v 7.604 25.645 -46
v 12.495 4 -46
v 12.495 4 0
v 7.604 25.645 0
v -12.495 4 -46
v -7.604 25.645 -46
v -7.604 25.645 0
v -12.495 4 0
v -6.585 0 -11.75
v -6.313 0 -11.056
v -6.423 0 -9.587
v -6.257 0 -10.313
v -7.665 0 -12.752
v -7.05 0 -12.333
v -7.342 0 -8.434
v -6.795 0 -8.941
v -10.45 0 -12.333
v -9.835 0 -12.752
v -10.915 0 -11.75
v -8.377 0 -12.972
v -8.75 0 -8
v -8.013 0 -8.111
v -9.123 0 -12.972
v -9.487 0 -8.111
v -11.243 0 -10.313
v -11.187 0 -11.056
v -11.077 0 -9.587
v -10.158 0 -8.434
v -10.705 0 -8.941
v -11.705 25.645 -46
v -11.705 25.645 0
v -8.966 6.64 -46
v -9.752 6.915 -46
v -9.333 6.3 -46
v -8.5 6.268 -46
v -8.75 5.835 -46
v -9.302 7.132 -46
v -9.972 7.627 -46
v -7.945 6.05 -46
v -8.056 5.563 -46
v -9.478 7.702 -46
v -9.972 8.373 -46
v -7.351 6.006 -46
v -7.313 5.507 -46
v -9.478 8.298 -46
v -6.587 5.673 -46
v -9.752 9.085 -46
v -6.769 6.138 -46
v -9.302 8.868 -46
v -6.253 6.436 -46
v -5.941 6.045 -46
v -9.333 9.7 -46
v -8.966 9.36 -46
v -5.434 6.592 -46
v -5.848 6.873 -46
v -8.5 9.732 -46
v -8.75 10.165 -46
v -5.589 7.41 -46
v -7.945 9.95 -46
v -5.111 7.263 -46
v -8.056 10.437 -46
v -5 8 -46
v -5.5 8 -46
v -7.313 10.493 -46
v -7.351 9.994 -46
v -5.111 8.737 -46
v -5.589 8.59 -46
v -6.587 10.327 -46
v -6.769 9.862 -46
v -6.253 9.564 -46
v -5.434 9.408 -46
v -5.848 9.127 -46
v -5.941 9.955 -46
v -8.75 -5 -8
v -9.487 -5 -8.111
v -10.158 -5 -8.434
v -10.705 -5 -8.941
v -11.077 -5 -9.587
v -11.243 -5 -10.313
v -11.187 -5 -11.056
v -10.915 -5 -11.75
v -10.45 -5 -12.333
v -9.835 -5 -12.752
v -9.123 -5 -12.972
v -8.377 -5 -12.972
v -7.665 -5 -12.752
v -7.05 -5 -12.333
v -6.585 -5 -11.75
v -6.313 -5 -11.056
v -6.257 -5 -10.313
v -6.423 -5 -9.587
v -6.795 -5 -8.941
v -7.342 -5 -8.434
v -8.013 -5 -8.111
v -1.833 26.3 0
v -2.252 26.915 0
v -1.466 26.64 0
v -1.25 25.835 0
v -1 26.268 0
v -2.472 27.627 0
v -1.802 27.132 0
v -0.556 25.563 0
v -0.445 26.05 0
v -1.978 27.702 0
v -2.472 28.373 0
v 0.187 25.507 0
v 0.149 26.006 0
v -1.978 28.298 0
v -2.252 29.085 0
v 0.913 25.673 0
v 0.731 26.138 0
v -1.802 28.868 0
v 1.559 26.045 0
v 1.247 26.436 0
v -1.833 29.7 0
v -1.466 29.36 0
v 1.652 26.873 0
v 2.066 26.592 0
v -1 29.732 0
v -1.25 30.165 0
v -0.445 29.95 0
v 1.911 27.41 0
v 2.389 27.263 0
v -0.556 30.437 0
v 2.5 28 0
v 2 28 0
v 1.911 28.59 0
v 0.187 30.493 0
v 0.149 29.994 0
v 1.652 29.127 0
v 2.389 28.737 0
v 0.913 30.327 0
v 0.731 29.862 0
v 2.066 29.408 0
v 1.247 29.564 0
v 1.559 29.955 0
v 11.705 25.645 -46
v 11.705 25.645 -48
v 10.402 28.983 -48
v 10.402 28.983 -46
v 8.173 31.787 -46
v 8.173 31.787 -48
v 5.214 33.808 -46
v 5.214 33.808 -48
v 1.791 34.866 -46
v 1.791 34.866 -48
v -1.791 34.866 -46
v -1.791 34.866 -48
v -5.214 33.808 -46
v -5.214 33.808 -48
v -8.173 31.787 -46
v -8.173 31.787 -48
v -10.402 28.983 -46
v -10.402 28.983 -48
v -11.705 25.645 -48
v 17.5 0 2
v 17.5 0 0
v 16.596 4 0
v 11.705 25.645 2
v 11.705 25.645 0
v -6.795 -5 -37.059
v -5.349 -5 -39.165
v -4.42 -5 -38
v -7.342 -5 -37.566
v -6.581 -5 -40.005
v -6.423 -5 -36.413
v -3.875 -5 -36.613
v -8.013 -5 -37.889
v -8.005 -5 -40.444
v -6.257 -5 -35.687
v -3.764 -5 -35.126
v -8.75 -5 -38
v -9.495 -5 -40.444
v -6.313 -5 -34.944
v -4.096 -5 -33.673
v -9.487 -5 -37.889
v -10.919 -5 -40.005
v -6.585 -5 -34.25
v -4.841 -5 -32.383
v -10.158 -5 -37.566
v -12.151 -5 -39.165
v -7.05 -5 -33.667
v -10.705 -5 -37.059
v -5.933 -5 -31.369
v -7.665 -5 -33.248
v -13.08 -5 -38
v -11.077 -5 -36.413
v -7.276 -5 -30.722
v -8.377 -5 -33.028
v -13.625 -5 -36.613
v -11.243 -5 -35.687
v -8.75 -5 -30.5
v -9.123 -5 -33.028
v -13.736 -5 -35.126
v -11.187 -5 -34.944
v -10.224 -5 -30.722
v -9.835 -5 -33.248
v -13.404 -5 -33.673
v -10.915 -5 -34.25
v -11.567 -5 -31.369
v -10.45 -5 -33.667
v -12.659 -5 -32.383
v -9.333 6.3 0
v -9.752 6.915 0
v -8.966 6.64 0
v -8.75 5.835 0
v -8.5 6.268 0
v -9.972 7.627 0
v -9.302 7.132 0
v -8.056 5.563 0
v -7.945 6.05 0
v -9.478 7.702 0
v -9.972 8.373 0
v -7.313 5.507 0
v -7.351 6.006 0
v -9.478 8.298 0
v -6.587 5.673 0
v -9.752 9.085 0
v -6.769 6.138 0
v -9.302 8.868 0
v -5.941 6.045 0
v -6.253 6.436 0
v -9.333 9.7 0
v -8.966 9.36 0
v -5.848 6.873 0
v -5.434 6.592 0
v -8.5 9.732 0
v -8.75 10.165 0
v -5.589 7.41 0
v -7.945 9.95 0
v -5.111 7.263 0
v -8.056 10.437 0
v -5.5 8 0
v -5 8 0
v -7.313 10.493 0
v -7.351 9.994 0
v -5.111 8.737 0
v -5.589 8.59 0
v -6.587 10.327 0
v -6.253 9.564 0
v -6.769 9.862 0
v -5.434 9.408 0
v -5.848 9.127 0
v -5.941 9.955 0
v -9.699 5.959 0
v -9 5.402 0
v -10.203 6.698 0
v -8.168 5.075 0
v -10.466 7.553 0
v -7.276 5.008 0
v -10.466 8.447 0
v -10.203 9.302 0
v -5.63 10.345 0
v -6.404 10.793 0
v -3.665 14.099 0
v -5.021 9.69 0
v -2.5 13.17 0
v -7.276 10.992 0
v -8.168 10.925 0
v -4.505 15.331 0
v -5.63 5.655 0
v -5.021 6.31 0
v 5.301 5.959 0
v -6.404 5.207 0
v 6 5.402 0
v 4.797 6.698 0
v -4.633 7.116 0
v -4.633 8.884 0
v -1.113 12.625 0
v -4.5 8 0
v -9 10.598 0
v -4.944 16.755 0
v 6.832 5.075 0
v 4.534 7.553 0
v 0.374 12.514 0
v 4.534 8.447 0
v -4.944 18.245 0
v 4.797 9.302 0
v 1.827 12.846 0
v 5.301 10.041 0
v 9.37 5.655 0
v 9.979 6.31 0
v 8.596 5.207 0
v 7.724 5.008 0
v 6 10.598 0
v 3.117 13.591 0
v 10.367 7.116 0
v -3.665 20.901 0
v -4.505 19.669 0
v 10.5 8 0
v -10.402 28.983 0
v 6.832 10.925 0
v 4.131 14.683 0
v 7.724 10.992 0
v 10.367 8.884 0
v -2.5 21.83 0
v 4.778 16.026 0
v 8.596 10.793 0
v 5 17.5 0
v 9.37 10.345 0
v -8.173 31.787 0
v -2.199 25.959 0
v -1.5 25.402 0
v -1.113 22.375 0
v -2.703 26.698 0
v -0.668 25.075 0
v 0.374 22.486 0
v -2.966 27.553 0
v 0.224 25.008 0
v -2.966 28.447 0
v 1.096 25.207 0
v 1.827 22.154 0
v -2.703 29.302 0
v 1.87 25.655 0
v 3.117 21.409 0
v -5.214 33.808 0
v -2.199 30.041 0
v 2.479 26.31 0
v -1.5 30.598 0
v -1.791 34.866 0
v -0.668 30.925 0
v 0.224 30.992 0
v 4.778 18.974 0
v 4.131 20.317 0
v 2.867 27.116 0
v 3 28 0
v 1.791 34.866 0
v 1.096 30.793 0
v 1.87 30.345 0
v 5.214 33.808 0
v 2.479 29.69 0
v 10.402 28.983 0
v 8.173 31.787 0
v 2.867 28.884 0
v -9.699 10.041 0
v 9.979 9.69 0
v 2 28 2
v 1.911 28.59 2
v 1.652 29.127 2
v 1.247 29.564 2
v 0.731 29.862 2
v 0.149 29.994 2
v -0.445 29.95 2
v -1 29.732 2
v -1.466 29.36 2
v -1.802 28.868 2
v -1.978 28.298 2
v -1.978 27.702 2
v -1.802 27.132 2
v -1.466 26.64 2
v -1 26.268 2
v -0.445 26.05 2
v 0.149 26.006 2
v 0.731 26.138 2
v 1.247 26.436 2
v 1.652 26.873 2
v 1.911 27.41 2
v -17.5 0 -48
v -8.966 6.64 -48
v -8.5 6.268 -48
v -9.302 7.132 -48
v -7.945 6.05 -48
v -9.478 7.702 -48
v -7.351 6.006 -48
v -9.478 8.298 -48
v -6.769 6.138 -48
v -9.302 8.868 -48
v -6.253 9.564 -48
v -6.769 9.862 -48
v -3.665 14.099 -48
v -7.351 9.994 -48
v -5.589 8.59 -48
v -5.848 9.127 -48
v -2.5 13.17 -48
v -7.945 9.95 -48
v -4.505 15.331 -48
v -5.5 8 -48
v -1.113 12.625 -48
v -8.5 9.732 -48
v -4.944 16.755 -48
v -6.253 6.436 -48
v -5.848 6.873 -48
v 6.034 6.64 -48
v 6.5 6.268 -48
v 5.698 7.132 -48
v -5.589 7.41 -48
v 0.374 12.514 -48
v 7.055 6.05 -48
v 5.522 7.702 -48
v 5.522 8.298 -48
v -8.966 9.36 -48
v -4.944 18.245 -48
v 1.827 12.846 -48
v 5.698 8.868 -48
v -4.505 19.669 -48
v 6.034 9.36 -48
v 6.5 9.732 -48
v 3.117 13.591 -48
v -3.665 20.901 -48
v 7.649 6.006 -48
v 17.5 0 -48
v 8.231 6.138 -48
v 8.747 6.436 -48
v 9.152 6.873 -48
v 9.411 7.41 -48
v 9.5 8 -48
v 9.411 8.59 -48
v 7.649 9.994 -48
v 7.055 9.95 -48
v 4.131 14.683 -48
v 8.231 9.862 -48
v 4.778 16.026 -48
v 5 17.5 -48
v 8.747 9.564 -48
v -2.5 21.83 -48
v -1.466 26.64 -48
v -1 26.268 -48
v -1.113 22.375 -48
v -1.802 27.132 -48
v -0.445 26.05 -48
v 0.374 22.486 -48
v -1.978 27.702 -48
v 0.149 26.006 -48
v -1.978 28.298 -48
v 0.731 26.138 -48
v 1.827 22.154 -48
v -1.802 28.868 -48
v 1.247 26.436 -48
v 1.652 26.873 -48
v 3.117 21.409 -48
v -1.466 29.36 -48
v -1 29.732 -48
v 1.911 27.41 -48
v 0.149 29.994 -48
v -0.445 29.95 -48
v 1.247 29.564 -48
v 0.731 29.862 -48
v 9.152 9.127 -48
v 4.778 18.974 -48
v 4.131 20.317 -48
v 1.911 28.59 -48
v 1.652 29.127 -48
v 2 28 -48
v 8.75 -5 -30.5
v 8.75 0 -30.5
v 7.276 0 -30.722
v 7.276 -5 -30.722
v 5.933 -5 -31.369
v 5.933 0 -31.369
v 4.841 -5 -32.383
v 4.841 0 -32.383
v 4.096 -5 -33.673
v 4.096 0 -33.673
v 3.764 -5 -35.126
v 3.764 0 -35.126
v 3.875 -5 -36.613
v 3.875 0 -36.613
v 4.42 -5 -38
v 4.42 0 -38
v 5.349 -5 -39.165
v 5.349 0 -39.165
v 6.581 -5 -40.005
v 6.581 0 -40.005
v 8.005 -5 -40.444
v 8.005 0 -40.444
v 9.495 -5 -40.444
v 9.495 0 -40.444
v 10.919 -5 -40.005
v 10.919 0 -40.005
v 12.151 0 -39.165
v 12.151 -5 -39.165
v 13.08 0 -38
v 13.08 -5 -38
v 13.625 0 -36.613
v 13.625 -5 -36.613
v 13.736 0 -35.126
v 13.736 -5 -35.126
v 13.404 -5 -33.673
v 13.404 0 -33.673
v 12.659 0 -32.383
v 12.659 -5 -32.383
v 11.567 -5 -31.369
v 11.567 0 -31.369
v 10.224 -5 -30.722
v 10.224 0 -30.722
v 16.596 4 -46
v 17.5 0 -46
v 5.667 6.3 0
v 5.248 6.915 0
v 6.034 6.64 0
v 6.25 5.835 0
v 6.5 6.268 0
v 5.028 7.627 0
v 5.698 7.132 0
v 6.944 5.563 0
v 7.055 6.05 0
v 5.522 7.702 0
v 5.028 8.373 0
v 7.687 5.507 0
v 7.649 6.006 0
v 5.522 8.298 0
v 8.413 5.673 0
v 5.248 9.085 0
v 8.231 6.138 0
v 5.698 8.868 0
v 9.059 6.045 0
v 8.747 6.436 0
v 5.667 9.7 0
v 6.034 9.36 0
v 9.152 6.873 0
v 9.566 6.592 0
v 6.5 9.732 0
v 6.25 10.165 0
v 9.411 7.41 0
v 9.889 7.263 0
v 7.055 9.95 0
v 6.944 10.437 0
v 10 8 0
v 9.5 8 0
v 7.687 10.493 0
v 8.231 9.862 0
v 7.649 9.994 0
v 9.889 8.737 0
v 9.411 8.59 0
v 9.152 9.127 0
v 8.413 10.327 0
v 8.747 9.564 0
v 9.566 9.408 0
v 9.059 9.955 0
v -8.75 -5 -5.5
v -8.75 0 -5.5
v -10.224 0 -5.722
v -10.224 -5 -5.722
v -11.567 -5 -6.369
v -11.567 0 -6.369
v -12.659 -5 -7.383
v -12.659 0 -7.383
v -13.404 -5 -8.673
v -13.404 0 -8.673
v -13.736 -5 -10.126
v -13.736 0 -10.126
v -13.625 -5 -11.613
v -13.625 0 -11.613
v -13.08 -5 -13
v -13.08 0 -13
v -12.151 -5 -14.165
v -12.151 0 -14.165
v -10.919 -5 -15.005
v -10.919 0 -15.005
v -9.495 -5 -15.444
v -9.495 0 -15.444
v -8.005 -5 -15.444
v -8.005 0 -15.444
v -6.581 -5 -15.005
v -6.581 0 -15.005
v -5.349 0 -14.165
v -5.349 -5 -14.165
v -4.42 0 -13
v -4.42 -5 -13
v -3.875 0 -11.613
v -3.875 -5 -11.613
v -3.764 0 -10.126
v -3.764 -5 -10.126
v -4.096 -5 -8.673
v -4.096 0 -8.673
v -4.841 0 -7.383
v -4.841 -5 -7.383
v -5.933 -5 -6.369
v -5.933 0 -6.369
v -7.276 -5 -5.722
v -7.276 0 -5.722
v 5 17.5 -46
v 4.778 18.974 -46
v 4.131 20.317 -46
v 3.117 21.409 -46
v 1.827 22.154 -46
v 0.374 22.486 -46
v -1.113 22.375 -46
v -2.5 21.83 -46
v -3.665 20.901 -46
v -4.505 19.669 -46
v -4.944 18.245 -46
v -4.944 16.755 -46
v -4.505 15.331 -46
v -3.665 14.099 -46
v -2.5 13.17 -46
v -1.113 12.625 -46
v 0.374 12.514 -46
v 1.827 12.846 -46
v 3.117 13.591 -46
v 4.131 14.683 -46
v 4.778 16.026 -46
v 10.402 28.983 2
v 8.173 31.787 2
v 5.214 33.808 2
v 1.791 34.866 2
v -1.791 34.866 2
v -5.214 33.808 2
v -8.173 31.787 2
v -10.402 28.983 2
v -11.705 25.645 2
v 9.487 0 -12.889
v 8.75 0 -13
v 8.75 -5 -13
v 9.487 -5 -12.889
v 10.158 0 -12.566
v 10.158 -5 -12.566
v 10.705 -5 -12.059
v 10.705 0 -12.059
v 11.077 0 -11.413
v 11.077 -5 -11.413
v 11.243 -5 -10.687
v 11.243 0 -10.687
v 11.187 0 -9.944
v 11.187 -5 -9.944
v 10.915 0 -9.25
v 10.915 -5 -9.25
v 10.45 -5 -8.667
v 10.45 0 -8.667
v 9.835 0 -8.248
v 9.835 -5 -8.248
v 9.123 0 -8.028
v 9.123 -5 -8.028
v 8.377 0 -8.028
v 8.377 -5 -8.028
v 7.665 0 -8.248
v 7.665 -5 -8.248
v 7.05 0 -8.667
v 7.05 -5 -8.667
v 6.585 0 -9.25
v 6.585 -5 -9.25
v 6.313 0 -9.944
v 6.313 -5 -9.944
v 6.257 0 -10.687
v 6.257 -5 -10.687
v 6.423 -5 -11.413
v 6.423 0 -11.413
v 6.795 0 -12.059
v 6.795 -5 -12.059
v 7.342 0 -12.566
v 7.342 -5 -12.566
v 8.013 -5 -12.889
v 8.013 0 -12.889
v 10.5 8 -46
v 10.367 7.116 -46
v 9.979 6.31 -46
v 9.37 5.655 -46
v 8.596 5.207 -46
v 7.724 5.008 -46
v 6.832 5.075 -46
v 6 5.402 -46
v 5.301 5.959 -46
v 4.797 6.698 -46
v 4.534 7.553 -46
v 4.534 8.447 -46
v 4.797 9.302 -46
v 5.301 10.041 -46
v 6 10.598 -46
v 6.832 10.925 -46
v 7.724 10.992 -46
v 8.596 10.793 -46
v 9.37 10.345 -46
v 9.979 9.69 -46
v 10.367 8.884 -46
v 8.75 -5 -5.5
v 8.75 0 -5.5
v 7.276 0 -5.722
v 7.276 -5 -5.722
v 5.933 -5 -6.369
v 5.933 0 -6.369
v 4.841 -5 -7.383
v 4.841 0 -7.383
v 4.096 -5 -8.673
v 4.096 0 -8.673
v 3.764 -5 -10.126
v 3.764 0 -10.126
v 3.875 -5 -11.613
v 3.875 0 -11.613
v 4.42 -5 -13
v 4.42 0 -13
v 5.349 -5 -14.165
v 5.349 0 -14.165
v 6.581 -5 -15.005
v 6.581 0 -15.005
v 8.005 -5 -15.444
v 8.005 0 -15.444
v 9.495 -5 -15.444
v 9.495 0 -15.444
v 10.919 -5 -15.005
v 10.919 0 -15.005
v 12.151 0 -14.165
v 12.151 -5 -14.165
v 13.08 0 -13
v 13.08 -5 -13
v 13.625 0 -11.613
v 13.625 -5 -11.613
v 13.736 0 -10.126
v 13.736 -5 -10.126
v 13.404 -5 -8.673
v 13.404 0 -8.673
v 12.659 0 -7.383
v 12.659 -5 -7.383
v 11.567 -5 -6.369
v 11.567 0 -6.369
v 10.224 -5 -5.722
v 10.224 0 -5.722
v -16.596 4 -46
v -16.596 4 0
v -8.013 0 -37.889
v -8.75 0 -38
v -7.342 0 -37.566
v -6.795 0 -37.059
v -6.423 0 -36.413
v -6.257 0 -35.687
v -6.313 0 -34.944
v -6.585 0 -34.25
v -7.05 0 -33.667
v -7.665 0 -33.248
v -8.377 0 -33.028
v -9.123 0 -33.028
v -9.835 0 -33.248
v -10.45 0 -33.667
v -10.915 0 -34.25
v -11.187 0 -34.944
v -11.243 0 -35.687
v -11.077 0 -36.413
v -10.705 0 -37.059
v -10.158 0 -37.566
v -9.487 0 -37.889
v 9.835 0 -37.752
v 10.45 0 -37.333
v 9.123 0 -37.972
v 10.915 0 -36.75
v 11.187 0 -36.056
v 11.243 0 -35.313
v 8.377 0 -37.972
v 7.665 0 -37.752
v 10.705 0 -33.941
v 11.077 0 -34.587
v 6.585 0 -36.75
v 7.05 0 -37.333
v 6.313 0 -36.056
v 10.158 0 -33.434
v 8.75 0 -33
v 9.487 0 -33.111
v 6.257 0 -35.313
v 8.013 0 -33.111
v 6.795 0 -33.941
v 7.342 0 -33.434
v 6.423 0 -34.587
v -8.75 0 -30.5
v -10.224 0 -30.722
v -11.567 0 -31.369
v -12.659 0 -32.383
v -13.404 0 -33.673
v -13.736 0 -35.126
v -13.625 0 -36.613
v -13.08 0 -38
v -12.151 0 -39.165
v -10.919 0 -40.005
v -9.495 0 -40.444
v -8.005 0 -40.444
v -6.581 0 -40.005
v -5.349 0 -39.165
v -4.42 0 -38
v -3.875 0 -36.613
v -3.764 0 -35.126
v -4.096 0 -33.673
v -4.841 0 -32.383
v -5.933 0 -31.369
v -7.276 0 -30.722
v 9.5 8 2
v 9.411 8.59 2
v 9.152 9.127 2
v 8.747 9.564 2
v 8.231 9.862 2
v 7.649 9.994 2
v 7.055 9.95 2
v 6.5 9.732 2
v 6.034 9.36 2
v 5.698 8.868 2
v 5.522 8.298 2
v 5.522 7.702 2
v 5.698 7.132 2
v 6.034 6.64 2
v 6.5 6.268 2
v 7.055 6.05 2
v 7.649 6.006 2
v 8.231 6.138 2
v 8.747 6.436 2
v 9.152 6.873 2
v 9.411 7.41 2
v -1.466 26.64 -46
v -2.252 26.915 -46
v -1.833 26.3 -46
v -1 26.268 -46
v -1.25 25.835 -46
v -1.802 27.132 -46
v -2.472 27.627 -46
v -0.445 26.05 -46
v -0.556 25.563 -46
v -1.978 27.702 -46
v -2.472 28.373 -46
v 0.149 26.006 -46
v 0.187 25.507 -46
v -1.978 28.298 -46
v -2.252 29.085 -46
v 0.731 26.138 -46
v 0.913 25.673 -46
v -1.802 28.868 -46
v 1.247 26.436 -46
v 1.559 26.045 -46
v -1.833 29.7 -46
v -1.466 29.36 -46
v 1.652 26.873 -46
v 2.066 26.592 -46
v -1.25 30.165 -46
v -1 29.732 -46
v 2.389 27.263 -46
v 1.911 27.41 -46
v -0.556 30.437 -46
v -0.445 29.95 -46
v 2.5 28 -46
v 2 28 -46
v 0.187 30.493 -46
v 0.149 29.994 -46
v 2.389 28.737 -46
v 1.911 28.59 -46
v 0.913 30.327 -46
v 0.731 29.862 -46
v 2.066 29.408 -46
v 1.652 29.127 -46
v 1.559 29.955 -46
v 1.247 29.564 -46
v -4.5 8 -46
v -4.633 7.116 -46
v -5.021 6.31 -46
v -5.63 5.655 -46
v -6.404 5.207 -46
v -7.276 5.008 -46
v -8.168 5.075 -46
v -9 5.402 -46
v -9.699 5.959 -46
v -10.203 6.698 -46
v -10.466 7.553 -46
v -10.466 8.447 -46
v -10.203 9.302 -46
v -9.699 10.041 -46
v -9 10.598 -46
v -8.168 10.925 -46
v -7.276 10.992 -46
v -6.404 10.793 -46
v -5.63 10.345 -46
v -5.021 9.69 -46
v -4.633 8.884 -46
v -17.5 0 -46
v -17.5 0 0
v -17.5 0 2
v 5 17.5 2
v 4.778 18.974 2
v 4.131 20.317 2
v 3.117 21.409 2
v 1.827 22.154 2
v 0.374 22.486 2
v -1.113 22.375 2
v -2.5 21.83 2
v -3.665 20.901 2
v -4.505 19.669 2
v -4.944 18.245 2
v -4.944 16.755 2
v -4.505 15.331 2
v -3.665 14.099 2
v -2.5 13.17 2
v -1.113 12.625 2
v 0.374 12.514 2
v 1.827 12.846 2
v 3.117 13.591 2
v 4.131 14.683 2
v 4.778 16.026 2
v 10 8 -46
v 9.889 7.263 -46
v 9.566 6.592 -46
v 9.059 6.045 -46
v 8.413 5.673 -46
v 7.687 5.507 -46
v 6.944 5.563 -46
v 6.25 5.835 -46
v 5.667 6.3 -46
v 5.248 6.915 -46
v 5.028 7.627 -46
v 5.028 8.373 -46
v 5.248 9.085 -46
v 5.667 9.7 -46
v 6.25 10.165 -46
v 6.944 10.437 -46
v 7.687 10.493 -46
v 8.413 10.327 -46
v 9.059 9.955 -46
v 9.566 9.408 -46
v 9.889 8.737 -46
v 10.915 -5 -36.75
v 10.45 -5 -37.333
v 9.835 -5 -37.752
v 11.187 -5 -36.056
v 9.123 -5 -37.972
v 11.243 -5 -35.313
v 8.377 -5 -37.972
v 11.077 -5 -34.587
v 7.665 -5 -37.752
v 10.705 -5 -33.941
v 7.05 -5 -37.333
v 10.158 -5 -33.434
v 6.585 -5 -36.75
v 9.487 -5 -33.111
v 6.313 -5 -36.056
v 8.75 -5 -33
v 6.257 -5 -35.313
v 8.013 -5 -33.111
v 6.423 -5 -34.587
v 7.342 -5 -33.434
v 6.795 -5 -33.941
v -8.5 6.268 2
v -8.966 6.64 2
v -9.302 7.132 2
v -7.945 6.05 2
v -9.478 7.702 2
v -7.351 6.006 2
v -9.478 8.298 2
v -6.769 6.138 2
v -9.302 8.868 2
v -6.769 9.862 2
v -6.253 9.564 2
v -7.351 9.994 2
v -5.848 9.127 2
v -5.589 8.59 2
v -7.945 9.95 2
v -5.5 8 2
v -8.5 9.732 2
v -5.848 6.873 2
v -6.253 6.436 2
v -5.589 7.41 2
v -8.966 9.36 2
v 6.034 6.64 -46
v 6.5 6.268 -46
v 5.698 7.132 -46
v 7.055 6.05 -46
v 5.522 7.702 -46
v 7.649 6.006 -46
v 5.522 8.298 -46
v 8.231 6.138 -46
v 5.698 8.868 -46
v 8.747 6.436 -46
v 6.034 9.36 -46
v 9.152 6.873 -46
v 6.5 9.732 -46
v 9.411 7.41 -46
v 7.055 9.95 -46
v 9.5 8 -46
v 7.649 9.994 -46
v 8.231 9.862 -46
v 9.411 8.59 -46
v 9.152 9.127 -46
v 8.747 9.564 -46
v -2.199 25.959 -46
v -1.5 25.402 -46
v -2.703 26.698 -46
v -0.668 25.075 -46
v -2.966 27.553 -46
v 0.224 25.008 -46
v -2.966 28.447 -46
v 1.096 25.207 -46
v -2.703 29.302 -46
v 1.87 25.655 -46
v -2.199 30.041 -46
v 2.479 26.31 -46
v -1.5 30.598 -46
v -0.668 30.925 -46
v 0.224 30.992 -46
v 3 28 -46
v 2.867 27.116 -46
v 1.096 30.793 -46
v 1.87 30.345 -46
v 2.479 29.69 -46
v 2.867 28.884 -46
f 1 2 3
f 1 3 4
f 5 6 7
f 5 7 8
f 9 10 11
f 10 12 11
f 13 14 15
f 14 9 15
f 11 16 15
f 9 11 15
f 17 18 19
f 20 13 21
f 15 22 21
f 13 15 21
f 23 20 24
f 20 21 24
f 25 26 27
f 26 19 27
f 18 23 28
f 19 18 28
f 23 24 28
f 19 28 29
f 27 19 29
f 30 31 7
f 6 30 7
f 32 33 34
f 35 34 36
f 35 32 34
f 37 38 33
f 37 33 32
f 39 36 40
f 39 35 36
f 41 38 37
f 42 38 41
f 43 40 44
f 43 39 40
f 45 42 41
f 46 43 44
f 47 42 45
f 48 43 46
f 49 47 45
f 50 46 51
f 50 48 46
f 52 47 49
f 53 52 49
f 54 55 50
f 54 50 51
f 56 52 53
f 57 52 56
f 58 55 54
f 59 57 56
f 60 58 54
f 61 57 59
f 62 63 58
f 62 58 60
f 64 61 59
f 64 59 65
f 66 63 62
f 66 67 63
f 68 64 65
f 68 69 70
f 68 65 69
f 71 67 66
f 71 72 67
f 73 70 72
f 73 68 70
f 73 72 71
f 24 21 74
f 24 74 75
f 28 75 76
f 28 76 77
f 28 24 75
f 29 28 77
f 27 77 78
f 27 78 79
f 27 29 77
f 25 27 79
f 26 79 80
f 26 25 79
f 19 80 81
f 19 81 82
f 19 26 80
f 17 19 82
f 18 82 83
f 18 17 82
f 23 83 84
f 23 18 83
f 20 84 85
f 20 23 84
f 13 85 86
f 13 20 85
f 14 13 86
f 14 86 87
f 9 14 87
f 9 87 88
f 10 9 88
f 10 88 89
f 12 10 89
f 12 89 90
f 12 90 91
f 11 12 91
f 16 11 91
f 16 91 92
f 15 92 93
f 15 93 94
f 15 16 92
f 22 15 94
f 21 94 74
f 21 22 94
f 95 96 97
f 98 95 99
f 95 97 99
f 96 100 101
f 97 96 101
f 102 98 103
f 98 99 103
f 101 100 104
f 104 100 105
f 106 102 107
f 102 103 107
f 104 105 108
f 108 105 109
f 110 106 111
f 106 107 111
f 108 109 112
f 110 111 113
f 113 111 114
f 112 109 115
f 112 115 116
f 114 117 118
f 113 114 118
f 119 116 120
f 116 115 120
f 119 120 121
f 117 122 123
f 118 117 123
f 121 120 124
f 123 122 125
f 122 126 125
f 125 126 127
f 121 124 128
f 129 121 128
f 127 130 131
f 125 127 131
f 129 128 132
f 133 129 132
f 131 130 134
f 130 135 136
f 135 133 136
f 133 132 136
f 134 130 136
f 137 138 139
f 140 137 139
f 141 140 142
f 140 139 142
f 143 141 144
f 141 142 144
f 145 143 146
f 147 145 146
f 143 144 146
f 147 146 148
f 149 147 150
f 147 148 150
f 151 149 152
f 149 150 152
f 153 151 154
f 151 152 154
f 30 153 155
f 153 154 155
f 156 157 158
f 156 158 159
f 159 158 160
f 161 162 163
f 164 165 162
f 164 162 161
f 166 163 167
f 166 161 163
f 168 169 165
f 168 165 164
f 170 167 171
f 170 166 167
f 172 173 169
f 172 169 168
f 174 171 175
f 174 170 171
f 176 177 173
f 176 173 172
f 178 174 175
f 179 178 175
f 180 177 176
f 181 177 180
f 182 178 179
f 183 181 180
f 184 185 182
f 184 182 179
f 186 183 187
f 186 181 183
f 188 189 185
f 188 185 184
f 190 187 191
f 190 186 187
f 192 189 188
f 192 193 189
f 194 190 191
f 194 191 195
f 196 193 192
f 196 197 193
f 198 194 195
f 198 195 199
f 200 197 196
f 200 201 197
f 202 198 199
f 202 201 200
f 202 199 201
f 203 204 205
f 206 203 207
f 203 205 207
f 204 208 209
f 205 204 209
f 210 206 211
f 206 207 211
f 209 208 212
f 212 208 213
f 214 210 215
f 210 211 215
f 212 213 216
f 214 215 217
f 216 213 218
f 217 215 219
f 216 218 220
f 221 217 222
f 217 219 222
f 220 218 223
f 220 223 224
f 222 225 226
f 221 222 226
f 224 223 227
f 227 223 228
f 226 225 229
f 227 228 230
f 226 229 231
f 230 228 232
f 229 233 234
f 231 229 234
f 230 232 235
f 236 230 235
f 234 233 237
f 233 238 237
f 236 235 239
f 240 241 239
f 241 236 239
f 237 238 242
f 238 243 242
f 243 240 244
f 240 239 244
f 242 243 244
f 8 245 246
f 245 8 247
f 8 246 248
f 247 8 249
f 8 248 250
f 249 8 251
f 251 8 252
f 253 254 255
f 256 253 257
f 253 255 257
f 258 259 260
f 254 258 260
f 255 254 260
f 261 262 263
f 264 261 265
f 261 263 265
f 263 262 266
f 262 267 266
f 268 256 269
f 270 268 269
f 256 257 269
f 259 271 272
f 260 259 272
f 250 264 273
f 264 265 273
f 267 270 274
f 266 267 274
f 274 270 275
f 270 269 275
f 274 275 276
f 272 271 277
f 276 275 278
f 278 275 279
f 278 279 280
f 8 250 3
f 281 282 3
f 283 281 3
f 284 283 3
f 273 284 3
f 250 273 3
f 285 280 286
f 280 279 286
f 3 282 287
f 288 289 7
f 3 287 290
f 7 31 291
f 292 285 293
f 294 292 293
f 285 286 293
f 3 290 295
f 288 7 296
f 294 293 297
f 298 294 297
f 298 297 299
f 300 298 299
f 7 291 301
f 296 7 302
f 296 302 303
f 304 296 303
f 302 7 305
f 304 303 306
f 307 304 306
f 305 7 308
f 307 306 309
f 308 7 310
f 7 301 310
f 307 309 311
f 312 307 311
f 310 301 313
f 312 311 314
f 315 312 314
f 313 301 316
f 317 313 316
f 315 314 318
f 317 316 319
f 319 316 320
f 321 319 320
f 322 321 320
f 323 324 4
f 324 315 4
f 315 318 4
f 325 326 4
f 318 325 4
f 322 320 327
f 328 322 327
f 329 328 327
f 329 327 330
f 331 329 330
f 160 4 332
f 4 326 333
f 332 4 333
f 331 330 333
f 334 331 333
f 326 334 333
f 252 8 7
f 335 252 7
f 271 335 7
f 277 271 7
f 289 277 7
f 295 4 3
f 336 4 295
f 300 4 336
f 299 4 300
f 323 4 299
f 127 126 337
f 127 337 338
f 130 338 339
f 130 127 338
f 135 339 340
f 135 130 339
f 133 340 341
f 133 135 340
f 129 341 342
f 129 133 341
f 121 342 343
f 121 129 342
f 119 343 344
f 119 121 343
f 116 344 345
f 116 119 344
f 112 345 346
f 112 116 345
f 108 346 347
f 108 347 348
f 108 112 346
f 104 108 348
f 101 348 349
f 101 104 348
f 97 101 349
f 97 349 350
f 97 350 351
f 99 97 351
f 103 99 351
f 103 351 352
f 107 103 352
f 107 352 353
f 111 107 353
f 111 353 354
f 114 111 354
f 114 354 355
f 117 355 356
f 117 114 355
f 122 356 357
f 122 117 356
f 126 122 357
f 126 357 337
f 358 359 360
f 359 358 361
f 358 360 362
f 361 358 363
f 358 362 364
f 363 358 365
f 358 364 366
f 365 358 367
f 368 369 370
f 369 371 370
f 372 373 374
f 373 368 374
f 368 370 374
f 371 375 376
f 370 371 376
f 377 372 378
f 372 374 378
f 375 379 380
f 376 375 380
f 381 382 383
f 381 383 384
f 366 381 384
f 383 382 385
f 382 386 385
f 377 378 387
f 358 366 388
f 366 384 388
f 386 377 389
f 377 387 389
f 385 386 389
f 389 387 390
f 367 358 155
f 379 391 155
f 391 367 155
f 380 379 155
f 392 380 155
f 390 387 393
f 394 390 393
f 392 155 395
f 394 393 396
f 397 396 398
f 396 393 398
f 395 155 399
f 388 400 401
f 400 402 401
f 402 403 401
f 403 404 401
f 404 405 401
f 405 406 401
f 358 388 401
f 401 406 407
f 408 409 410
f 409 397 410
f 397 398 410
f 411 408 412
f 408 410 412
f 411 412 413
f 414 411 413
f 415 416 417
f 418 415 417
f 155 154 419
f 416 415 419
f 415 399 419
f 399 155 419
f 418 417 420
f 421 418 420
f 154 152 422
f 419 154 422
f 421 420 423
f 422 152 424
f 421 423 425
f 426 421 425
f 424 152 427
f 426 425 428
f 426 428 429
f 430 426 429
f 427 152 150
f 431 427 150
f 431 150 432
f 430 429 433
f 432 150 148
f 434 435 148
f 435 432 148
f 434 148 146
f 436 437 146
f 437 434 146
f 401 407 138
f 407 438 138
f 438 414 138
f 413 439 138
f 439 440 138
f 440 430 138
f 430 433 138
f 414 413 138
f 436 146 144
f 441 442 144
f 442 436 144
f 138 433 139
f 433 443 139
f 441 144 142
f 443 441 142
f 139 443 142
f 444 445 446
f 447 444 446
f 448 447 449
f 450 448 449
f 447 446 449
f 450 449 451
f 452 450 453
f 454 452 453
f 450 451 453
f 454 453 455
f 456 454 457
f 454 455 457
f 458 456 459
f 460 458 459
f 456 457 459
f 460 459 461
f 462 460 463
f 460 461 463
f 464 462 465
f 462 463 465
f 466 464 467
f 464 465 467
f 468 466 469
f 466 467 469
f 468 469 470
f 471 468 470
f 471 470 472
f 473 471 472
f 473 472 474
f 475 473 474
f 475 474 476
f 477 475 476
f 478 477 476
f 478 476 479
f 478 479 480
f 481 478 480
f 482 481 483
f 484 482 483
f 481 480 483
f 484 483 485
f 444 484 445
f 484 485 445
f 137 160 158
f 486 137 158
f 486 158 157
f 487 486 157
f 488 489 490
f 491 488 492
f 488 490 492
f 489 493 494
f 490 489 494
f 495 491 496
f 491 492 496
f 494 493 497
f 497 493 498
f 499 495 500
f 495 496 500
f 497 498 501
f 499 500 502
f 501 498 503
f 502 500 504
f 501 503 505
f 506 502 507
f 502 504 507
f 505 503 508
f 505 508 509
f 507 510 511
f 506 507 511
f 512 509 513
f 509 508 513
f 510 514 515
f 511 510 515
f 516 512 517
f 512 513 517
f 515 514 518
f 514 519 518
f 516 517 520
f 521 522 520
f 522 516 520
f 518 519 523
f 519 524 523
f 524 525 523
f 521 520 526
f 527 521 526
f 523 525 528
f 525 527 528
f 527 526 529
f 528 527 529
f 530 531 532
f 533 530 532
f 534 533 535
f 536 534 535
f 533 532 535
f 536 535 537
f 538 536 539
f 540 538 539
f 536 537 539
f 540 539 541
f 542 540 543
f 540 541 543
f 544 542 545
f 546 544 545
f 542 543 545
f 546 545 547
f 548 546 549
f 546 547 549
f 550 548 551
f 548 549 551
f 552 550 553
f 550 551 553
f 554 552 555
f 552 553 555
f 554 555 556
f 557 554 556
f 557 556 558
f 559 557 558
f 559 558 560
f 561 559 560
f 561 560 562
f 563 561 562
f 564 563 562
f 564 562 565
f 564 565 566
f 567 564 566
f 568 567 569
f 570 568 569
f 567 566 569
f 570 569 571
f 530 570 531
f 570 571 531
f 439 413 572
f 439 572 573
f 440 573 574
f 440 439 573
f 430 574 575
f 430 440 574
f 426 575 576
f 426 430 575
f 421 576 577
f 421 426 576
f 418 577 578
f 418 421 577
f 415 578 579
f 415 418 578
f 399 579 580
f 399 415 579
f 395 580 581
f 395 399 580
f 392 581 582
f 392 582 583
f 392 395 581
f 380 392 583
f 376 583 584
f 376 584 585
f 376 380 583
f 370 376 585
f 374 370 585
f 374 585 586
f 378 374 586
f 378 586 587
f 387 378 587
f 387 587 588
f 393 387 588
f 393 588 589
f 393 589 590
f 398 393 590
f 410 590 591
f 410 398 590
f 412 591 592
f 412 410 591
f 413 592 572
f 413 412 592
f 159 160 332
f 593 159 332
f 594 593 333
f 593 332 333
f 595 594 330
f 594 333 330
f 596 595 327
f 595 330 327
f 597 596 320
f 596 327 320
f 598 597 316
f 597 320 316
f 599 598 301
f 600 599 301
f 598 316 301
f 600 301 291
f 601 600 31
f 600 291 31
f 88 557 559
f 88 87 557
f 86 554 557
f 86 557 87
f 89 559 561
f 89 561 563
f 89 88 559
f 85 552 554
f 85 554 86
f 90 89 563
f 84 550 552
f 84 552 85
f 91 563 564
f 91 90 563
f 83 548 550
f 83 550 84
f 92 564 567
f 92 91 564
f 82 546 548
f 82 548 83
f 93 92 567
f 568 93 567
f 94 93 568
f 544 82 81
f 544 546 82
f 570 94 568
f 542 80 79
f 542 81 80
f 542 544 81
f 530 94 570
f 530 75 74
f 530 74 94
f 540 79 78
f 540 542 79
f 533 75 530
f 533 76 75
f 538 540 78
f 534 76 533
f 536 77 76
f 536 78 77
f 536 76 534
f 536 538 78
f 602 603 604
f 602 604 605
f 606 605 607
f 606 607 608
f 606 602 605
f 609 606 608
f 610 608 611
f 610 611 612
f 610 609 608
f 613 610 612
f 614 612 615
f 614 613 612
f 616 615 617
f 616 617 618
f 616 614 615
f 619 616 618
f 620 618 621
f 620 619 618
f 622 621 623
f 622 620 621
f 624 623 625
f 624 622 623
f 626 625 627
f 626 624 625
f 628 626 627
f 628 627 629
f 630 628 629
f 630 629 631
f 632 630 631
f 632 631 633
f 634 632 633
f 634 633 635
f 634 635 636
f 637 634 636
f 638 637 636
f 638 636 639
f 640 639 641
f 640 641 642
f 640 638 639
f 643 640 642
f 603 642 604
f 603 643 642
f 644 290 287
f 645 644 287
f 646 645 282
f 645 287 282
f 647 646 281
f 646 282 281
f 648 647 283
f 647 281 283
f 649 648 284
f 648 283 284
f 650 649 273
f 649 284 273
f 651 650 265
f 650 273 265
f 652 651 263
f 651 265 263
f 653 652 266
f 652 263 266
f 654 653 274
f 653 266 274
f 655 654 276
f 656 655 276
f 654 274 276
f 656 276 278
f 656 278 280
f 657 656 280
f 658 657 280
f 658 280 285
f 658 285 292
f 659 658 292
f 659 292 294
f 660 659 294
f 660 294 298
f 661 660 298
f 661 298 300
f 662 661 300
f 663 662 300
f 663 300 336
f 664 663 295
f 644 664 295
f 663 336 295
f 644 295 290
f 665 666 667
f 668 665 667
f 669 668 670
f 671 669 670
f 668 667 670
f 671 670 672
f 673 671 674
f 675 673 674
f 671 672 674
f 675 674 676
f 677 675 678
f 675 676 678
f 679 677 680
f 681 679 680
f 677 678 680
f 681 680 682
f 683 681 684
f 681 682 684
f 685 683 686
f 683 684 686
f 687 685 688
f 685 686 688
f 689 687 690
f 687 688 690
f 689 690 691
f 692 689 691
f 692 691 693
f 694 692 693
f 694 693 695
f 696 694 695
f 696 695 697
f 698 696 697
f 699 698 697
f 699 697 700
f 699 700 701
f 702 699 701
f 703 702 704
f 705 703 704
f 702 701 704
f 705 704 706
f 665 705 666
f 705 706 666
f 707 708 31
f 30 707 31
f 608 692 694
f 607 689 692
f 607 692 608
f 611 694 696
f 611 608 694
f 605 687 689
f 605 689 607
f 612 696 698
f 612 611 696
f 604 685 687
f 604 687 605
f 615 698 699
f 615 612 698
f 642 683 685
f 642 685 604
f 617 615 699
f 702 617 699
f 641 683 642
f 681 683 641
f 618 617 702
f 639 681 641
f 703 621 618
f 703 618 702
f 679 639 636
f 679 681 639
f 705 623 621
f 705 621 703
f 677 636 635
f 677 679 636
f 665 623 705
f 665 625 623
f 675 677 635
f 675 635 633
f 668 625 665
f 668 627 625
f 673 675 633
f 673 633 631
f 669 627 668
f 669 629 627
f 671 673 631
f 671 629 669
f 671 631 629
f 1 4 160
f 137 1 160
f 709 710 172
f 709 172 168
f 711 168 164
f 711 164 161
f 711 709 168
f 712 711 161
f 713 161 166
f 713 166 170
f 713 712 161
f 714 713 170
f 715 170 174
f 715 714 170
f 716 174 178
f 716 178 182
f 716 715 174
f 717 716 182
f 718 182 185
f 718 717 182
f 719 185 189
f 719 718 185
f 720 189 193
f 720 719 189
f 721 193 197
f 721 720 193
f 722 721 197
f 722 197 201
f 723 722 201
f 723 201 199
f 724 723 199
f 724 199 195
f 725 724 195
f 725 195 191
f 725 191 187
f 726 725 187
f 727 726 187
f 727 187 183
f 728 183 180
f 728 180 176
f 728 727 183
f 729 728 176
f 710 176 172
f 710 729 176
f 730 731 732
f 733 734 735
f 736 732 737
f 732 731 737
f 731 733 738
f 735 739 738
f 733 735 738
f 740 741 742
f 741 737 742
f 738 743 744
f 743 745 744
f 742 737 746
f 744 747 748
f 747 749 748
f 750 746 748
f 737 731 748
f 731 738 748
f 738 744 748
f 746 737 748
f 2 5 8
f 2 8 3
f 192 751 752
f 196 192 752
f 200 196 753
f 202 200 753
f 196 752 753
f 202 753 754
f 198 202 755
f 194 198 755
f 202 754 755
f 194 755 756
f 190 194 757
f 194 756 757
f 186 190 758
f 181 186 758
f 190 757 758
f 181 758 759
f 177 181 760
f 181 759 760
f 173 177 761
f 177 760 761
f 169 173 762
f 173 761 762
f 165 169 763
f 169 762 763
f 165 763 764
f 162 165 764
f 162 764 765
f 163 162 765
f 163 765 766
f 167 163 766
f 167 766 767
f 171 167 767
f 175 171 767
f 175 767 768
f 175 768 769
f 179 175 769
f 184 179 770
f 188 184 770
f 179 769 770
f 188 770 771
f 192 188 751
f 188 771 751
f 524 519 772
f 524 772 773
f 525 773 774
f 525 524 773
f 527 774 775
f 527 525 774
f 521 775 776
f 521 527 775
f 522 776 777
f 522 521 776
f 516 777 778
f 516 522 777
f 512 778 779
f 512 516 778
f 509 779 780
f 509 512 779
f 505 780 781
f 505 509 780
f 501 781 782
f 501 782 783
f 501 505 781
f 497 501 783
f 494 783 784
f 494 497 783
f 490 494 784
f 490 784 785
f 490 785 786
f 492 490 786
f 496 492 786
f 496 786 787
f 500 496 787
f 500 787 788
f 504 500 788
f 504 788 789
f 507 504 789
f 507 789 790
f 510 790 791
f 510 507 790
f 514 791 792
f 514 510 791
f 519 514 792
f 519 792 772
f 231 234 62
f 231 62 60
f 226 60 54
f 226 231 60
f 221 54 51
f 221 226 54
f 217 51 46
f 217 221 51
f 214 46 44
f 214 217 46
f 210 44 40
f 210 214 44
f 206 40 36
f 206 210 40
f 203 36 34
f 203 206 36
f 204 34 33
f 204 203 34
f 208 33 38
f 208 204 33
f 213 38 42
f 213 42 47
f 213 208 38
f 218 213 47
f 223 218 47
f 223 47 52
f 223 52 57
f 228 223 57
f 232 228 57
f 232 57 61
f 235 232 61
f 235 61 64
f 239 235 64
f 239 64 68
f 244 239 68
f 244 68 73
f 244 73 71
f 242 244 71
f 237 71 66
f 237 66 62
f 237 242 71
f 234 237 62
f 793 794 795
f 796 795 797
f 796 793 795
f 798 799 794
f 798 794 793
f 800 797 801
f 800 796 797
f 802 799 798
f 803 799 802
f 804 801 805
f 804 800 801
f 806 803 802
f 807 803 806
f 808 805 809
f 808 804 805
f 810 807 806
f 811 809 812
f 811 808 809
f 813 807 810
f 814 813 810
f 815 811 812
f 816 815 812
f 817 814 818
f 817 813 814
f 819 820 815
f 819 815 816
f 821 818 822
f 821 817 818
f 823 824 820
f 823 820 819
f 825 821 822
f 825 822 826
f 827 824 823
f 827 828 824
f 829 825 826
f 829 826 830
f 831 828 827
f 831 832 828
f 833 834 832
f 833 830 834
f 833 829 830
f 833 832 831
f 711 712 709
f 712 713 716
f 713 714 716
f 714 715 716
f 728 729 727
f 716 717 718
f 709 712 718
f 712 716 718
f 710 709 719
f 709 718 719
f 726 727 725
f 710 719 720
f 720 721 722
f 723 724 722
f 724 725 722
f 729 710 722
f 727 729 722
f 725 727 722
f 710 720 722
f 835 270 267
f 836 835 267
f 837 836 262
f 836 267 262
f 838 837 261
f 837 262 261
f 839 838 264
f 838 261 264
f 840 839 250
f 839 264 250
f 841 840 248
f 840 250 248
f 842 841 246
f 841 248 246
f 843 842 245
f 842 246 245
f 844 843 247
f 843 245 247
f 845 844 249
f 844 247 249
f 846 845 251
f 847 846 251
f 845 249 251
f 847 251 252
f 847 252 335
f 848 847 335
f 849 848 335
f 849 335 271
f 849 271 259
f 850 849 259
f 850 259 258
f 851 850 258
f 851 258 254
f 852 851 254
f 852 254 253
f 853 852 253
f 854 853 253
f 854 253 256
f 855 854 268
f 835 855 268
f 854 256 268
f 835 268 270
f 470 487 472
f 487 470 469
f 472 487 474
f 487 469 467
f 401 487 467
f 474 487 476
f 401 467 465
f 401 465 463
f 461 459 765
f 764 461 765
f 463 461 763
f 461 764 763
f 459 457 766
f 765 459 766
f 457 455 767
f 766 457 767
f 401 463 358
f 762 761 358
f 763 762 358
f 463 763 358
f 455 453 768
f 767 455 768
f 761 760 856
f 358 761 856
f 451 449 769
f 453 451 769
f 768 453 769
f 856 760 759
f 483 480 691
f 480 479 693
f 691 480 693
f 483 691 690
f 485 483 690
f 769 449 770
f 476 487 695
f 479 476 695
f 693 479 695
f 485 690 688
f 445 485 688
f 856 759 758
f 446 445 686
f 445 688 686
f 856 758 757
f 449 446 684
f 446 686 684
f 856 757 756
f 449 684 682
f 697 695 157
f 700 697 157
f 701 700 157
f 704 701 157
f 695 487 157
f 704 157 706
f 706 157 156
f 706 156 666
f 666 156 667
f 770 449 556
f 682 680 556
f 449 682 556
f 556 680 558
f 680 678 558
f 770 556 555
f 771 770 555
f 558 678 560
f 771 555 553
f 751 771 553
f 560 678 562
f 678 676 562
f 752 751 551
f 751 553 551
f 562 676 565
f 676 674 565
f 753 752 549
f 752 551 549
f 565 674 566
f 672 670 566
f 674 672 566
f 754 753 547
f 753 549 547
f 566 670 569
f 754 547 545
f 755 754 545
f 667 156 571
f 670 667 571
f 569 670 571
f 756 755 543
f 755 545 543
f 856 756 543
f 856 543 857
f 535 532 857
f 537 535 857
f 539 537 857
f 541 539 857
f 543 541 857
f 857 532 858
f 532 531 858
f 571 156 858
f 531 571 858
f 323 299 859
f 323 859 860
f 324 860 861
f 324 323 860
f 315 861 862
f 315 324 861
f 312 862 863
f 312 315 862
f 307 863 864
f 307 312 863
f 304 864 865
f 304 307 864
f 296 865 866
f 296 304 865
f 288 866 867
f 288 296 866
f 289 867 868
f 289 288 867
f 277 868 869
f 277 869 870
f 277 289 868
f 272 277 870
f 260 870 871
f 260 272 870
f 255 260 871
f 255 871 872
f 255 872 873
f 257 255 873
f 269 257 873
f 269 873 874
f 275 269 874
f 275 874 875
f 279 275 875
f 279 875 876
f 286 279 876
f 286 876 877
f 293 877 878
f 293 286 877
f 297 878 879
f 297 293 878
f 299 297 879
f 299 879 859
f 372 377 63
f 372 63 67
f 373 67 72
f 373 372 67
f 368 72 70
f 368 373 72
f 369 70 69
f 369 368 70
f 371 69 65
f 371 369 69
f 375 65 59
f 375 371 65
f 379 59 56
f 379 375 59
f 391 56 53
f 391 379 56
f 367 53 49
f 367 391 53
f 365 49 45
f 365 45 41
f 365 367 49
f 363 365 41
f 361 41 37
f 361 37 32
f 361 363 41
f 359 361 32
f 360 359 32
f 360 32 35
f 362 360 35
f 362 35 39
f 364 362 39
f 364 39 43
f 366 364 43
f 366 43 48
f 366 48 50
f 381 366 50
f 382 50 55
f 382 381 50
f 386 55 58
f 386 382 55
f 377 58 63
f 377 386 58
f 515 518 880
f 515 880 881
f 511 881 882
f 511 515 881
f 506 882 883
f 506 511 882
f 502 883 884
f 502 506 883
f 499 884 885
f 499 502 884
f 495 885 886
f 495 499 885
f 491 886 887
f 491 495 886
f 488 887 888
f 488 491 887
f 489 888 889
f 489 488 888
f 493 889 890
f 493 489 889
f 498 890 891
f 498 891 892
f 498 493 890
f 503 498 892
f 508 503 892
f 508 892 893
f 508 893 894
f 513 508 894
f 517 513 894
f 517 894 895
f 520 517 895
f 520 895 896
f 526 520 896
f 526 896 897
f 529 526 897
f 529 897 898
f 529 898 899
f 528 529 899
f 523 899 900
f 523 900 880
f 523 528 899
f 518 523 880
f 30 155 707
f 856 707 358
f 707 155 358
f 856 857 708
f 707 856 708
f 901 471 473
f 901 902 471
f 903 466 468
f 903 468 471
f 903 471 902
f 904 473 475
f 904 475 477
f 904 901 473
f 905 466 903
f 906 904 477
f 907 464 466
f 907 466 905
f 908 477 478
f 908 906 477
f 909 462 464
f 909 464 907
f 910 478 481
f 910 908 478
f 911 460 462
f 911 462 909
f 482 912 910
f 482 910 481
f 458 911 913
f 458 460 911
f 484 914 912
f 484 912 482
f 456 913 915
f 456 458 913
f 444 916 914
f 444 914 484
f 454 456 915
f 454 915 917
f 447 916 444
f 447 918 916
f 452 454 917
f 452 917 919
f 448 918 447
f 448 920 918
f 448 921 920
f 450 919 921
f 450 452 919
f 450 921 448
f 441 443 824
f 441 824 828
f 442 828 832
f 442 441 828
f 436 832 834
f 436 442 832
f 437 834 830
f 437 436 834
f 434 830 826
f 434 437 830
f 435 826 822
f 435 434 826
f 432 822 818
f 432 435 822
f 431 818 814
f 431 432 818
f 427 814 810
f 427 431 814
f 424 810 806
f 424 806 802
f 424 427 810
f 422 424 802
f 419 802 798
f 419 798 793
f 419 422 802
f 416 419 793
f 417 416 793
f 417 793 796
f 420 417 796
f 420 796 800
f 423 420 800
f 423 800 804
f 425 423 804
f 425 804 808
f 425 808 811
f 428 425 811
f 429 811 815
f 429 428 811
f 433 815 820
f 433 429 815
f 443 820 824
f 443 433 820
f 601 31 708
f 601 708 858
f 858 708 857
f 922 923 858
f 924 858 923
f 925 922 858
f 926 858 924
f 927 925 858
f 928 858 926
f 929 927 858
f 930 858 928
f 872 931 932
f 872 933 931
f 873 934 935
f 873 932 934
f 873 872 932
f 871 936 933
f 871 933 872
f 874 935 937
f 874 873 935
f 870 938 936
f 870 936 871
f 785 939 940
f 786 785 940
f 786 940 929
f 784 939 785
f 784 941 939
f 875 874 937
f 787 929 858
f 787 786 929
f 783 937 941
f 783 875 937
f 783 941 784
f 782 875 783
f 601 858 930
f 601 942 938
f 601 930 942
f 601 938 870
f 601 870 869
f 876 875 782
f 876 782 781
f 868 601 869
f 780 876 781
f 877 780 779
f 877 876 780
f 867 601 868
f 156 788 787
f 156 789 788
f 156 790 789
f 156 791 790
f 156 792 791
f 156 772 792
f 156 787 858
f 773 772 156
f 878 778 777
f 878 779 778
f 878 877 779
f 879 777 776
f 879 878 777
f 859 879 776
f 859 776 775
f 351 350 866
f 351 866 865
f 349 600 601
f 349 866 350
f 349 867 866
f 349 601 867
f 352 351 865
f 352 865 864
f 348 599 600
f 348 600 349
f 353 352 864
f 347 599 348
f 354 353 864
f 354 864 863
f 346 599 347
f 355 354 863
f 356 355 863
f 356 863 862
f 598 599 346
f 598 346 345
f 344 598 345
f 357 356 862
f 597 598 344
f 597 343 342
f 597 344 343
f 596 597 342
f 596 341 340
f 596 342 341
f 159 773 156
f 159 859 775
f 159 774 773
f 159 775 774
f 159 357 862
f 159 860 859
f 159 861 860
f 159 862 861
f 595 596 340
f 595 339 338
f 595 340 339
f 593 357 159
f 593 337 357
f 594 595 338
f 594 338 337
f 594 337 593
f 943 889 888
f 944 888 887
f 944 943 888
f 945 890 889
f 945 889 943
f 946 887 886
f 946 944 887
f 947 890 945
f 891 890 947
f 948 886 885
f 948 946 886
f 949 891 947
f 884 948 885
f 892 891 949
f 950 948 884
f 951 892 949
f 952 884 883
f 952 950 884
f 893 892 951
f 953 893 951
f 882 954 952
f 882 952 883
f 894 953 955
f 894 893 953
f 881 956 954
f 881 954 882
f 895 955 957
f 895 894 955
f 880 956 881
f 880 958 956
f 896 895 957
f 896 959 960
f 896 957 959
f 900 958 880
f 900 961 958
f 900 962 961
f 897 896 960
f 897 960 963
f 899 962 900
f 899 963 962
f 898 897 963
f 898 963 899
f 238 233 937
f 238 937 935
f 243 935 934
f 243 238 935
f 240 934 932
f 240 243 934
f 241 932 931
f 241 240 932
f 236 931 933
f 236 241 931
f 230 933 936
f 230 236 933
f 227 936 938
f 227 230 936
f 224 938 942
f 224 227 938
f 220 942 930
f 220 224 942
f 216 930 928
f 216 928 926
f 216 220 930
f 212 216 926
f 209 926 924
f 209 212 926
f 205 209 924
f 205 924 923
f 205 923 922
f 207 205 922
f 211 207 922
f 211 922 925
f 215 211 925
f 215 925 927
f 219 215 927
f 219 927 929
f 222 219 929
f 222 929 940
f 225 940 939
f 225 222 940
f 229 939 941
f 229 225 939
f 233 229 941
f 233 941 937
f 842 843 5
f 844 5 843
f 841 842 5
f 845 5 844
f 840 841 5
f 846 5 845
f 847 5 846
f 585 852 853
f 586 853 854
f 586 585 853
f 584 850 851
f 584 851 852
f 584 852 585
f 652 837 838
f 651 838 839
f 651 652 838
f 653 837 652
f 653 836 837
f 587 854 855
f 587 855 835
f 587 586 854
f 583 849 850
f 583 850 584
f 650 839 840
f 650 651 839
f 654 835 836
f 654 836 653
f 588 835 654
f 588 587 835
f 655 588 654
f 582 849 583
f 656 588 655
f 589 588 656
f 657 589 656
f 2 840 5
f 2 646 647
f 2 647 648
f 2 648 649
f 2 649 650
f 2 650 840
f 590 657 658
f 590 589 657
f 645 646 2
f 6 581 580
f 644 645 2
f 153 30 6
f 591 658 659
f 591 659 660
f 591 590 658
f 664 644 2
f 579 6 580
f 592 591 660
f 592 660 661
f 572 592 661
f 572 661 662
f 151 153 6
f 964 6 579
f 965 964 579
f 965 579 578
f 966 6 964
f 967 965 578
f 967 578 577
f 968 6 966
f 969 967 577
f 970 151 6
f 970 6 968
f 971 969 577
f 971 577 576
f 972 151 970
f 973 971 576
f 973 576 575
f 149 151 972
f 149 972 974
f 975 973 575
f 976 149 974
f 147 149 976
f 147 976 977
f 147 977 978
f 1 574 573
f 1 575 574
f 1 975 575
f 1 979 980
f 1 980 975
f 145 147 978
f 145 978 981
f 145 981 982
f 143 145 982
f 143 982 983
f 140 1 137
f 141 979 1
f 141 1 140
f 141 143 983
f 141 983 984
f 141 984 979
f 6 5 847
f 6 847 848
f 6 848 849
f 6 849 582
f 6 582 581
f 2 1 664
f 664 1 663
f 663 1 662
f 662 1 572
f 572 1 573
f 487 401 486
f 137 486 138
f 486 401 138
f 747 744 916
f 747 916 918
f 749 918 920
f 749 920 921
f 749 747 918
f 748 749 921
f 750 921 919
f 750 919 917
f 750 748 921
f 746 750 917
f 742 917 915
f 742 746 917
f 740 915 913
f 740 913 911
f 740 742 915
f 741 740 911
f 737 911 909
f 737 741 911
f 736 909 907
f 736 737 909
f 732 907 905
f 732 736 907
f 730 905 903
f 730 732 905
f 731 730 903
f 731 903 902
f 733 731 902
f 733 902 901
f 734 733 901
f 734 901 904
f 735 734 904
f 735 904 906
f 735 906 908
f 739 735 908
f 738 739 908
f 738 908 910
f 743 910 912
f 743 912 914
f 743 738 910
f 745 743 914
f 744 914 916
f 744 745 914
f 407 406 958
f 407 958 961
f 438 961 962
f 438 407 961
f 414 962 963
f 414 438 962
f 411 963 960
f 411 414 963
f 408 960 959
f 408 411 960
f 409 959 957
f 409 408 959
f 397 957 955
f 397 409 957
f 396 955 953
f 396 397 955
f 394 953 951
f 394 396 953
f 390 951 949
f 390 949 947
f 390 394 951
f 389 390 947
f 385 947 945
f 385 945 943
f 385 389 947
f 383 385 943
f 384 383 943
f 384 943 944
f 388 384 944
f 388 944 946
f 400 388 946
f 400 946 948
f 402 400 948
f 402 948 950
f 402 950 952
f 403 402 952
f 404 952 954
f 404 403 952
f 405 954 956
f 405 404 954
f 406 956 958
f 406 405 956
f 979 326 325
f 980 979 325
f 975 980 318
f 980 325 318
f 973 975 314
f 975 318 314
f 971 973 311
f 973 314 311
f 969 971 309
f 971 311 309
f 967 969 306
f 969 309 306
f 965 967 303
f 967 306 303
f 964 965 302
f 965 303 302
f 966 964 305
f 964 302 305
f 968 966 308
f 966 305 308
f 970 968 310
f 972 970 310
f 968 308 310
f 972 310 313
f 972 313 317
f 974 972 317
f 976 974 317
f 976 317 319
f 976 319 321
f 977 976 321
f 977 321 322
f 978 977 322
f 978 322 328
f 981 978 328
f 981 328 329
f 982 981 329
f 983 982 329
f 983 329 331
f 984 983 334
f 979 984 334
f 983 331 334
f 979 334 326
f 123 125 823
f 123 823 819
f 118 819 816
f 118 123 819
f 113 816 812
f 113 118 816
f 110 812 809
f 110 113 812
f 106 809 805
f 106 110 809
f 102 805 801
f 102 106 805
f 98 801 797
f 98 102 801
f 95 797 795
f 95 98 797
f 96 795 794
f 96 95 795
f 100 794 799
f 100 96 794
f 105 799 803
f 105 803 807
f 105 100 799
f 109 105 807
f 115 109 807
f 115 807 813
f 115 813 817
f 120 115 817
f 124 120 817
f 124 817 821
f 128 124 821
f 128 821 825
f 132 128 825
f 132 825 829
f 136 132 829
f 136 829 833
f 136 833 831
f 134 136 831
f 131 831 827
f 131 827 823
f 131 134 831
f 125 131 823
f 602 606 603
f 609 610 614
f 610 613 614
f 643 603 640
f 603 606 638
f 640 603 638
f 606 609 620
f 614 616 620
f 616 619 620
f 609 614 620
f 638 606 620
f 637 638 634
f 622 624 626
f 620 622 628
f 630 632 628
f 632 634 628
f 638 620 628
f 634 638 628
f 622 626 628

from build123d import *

# Parameters (mm, degrees)
SKETCH1_R           = 5
SKETCH1_R_2         = 2
BOSS_EXTRUDE1_DEPTH = 2
SKETCH2_R           = 2
SKETCH2_R_2         = 5
BOSS_EXTRUDE2_DEPTH = 2
SKETCH4_R           = 3
SKETCH4_R_2         = 2.5
BOSS_EXTRUDE4_DEPTH = 46
BOSS_EXTRUDE5_REACH = 63.929
SKETCH8_R           = 5
SKETCH8_R_2         = 2.5
BOSS_EXTRUDE6_DEPTH = 5


with BuildPart() as part:
    # Sketch1 → Boss-Extrude1 (new body)
    with BuildSketch(Plane.XY):
        with BuildLine():
            Line((-17.5, 0), (17.5, 0))
            Line((17.5, 0), (11.704867869, 25.645008161))
            ThreePointArc((11.704867869, 25.645008161), (0, 35), (-11.704867869, 25.645008161))
            Line((-11.704867869, 25.645008161), (-17.5, 0))
        make_face()
        with Locations((0, 17.5)):
            Circle(SKETCH1_R, mode=Mode.SUBTRACT)
        with Locations((7.5, 8)):
            Circle(SKETCH1_R_2, mode=Mode.SUBTRACT)
        with Locations((-7.5, 8)):
            Circle(SKETCH1_R_2, mode=Mode.SUBTRACT)
        with Locations((0, 28)):
            Circle(SKETCH1_R_2, mode=Mode.SUBTRACT)
    extrude(amount=BOSS_EXTRUDE1_DEPTH)



with BuildPart() as body_2:
    # Sketch2 → Boss-Extrude2 (new body)
    with BuildSketch(Plane.XY.offset(-48)):
        with BuildLine():
            Line((17.5, 0), (11.704867869, 25.645008161))
            ThreePointArc((11.704867869, 25.645008161), (0, 35), (-11.704867869, 25.645008161))
            Line((-11.704867869, 25.645008161), (-17.5, 0))
            Line((-17.5, 0), (17.5, 0))
        make_face()
        with Locations((-7.5, 8)):
            Circle(SKETCH2_R, mode=Mode.SUBTRACT)
        with Locations((7.5, 8)):
            Circle(SKETCH2_R, mode=Mode.SUBTRACT)
        with Locations((0, 17.5)):
            Circle(SKETCH2_R_2, mode=Mode.SUBTRACT)
        with Locations((0, 28)):
            Circle(SKETCH2_R, mode=Mode.SUBTRACT)
    extrude(amount=BOSS_EXTRUDE2_DEPTH)


with BuildPart() as part_1:
    add(part.part)

    add(body_2.part)  # Boss-Extrude4 merges body 2
    # Sketch4 → Boss-Extrude4 (add)
    # profile 1 of 3: a face of its own
    with BuildSketch(Plane(origin=(0, 0, 0), x_dir=(-1, 0, 0), z_dir=(0, 0, -1))):
        with Locations(Location((7.5, 8, 0), (0, 0, 180))):
            Circle(SKETCH4_R)
        with Locations(Location((7.5, 8, 0), (0, 0, 180))):
            Circle(SKETCH4_R_2, mode=Mode.SUBTRACT)
    # profile 2 of 3: a face of its own
    with BuildSketch(Plane(origin=(0, 0, 0), x_dir=(-1, 0, 0), z_dir=(0, 0, -1))):
        with Locations(Location((0, 28, 0), (0, 0, 180))):
            Circle(SKETCH4_R)
        with Locations(Location((0, 28, 0), (0, 0, 180))):
            Circle(SKETCH4_R_2, mode=Mode.SUBTRACT)
    # profile 3 of 3: a face of its own
    with BuildSketch(Plane(origin=(0, 0, 0), x_dir=(-1, 0, 0), z_dir=(0, 0, -1))):
        with Locations(Location((-7.5, 8, 0), (0, 0, 180))):
            Circle(SKETCH4_R)
        with Locations(Location((-7.5, 8, 0), (0, 0, 180))):
            Circle(SKETCH4_R_2, mode=Mode.SUBTRACT)
    extrude(amount=BOSS_EXTRUDE4_DEPTH)

    # Sketch3 → Boss-Extrude5 (add, up to next)
    with BuildSketch(Plane(origin=(0, 0, 0), x_dir=(-1, 0, 0), z_dir=(0, 0, -1)), mode=Mode.PRIVATE) as boss_extrude5_sk1:
        Polygon((12.495241869, 4), (16.59609978, 4), (11.704867869, 25.645008161), (7.604009958, 25.645008161), align=None)
    boss_extrude5_tool1 = extrude(boss_extrude5_sk1.sketch, amount=BOSS_EXTRUDE5_REACH, mode=Mode.PRIVATE) - part_1.part
    # Sketch3 → Boss-Extrude5 (add, up to next)
    with BuildSketch(Plane(origin=(0, 0, 0), x_dir=(-1, 0, 0), z_dir=(0, 0, -1)), mode=Mode.PRIVATE) as boss_extrude5_sk2:
        Polygon((-16.59609978, 4), (-12.495241869, 4), (-7.604009958, 25.645008161), (-11.704867869, 25.645008161), align=None)
    boss_extrude5_tool2 = extrude(boss_extrude5_sk2.sketch, amount=BOSS_EXTRUDE5_REACH, mode=Mode.PRIVATE) - part_1.part
    # Sketch3 → Boss-Extrude5 (add, up to next)
    with BuildSketch(Plane(origin=(0, 0, 0), x_dir=(-1, 0, 0), z_dir=(0, 0, -1)), mode=Mode.PRIVATE) as boss_extrude5_sk3:
        Polygon((17.5, 0), (16.59609978, 4), (12.495241869, 4), (-12.495241869, 4), (-16.59609978, 4), (-17.5, 0), align=None)
    boss_extrude5_tool3 = extrude(boss_extrude5_sk3.sketch, amount=BOSS_EXTRUDE5_REACH, mode=Mode.PRIVATE) - part_1.part
    add(boss_extrude5_tool1.solids().sort_by_distance((-12.100055, 14.822504, 0))[0])
    add(boss_extrude5_tool2.solids().sort_by_distance((12.100055, 14.822504, 0))[0])
    add(boss_extrude5_tool3.solids().sort_by_distance((0, 1.982326, 0))[0])

    # Sketch8 → Boss-Extrude6 (add)
    # profile 1 of 4: a face of its own
    with BuildSketch(Plane.XZ):
        with Locations(Location((8.75, -10.5, 0), (0, 0, 90))):
            Circle(SKETCH8_R)
        with Locations(Location((8.75, -10.5, 0), (0, 0, 270))):
            Circle(SKETCH8_R_2, mode=Mode.SUBTRACT)
    # profile 2 of 4: a face of its own
    with BuildSketch(Plane.XZ):
        with Locations(Location((8.75, -35.5, 0), (0, 0, 90))):
            Circle(SKETCH8_R)
        with Locations(Location((8.75, -35.5, 0), (0, 0, 90))):
            Circle(SKETCH8_R_2, mode=Mode.SUBTRACT)
    # profile 3 of 4: a face of its own
    with BuildSketch(Plane.XZ):
        with Locations(Location((-8.75, -35.5, 0), (0, 0, 90))):
            Circle(SKETCH8_R)
        with Locations(Location((-8.75, -35.5, 0), (0, 0, 270))):
            Circle(SKETCH8_R_2, mode=Mode.SUBTRACT)
    # profile 4 of 4: a face of its own
    with BuildSketch(Plane.XZ):
        with Locations(Location((-8.75, -10.5, 0), (0, 0, 90))):
            Circle(SKETCH8_R)
        with Locations(Location((-8.75, -10.5, 0), (0, 0, 90))):
            Circle(SKETCH8_R_2, mode=Mode.SUBTRACT)
    extrude(amount=BOSS_EXTRUDE6_DEPTH)


solid = part_1.part
